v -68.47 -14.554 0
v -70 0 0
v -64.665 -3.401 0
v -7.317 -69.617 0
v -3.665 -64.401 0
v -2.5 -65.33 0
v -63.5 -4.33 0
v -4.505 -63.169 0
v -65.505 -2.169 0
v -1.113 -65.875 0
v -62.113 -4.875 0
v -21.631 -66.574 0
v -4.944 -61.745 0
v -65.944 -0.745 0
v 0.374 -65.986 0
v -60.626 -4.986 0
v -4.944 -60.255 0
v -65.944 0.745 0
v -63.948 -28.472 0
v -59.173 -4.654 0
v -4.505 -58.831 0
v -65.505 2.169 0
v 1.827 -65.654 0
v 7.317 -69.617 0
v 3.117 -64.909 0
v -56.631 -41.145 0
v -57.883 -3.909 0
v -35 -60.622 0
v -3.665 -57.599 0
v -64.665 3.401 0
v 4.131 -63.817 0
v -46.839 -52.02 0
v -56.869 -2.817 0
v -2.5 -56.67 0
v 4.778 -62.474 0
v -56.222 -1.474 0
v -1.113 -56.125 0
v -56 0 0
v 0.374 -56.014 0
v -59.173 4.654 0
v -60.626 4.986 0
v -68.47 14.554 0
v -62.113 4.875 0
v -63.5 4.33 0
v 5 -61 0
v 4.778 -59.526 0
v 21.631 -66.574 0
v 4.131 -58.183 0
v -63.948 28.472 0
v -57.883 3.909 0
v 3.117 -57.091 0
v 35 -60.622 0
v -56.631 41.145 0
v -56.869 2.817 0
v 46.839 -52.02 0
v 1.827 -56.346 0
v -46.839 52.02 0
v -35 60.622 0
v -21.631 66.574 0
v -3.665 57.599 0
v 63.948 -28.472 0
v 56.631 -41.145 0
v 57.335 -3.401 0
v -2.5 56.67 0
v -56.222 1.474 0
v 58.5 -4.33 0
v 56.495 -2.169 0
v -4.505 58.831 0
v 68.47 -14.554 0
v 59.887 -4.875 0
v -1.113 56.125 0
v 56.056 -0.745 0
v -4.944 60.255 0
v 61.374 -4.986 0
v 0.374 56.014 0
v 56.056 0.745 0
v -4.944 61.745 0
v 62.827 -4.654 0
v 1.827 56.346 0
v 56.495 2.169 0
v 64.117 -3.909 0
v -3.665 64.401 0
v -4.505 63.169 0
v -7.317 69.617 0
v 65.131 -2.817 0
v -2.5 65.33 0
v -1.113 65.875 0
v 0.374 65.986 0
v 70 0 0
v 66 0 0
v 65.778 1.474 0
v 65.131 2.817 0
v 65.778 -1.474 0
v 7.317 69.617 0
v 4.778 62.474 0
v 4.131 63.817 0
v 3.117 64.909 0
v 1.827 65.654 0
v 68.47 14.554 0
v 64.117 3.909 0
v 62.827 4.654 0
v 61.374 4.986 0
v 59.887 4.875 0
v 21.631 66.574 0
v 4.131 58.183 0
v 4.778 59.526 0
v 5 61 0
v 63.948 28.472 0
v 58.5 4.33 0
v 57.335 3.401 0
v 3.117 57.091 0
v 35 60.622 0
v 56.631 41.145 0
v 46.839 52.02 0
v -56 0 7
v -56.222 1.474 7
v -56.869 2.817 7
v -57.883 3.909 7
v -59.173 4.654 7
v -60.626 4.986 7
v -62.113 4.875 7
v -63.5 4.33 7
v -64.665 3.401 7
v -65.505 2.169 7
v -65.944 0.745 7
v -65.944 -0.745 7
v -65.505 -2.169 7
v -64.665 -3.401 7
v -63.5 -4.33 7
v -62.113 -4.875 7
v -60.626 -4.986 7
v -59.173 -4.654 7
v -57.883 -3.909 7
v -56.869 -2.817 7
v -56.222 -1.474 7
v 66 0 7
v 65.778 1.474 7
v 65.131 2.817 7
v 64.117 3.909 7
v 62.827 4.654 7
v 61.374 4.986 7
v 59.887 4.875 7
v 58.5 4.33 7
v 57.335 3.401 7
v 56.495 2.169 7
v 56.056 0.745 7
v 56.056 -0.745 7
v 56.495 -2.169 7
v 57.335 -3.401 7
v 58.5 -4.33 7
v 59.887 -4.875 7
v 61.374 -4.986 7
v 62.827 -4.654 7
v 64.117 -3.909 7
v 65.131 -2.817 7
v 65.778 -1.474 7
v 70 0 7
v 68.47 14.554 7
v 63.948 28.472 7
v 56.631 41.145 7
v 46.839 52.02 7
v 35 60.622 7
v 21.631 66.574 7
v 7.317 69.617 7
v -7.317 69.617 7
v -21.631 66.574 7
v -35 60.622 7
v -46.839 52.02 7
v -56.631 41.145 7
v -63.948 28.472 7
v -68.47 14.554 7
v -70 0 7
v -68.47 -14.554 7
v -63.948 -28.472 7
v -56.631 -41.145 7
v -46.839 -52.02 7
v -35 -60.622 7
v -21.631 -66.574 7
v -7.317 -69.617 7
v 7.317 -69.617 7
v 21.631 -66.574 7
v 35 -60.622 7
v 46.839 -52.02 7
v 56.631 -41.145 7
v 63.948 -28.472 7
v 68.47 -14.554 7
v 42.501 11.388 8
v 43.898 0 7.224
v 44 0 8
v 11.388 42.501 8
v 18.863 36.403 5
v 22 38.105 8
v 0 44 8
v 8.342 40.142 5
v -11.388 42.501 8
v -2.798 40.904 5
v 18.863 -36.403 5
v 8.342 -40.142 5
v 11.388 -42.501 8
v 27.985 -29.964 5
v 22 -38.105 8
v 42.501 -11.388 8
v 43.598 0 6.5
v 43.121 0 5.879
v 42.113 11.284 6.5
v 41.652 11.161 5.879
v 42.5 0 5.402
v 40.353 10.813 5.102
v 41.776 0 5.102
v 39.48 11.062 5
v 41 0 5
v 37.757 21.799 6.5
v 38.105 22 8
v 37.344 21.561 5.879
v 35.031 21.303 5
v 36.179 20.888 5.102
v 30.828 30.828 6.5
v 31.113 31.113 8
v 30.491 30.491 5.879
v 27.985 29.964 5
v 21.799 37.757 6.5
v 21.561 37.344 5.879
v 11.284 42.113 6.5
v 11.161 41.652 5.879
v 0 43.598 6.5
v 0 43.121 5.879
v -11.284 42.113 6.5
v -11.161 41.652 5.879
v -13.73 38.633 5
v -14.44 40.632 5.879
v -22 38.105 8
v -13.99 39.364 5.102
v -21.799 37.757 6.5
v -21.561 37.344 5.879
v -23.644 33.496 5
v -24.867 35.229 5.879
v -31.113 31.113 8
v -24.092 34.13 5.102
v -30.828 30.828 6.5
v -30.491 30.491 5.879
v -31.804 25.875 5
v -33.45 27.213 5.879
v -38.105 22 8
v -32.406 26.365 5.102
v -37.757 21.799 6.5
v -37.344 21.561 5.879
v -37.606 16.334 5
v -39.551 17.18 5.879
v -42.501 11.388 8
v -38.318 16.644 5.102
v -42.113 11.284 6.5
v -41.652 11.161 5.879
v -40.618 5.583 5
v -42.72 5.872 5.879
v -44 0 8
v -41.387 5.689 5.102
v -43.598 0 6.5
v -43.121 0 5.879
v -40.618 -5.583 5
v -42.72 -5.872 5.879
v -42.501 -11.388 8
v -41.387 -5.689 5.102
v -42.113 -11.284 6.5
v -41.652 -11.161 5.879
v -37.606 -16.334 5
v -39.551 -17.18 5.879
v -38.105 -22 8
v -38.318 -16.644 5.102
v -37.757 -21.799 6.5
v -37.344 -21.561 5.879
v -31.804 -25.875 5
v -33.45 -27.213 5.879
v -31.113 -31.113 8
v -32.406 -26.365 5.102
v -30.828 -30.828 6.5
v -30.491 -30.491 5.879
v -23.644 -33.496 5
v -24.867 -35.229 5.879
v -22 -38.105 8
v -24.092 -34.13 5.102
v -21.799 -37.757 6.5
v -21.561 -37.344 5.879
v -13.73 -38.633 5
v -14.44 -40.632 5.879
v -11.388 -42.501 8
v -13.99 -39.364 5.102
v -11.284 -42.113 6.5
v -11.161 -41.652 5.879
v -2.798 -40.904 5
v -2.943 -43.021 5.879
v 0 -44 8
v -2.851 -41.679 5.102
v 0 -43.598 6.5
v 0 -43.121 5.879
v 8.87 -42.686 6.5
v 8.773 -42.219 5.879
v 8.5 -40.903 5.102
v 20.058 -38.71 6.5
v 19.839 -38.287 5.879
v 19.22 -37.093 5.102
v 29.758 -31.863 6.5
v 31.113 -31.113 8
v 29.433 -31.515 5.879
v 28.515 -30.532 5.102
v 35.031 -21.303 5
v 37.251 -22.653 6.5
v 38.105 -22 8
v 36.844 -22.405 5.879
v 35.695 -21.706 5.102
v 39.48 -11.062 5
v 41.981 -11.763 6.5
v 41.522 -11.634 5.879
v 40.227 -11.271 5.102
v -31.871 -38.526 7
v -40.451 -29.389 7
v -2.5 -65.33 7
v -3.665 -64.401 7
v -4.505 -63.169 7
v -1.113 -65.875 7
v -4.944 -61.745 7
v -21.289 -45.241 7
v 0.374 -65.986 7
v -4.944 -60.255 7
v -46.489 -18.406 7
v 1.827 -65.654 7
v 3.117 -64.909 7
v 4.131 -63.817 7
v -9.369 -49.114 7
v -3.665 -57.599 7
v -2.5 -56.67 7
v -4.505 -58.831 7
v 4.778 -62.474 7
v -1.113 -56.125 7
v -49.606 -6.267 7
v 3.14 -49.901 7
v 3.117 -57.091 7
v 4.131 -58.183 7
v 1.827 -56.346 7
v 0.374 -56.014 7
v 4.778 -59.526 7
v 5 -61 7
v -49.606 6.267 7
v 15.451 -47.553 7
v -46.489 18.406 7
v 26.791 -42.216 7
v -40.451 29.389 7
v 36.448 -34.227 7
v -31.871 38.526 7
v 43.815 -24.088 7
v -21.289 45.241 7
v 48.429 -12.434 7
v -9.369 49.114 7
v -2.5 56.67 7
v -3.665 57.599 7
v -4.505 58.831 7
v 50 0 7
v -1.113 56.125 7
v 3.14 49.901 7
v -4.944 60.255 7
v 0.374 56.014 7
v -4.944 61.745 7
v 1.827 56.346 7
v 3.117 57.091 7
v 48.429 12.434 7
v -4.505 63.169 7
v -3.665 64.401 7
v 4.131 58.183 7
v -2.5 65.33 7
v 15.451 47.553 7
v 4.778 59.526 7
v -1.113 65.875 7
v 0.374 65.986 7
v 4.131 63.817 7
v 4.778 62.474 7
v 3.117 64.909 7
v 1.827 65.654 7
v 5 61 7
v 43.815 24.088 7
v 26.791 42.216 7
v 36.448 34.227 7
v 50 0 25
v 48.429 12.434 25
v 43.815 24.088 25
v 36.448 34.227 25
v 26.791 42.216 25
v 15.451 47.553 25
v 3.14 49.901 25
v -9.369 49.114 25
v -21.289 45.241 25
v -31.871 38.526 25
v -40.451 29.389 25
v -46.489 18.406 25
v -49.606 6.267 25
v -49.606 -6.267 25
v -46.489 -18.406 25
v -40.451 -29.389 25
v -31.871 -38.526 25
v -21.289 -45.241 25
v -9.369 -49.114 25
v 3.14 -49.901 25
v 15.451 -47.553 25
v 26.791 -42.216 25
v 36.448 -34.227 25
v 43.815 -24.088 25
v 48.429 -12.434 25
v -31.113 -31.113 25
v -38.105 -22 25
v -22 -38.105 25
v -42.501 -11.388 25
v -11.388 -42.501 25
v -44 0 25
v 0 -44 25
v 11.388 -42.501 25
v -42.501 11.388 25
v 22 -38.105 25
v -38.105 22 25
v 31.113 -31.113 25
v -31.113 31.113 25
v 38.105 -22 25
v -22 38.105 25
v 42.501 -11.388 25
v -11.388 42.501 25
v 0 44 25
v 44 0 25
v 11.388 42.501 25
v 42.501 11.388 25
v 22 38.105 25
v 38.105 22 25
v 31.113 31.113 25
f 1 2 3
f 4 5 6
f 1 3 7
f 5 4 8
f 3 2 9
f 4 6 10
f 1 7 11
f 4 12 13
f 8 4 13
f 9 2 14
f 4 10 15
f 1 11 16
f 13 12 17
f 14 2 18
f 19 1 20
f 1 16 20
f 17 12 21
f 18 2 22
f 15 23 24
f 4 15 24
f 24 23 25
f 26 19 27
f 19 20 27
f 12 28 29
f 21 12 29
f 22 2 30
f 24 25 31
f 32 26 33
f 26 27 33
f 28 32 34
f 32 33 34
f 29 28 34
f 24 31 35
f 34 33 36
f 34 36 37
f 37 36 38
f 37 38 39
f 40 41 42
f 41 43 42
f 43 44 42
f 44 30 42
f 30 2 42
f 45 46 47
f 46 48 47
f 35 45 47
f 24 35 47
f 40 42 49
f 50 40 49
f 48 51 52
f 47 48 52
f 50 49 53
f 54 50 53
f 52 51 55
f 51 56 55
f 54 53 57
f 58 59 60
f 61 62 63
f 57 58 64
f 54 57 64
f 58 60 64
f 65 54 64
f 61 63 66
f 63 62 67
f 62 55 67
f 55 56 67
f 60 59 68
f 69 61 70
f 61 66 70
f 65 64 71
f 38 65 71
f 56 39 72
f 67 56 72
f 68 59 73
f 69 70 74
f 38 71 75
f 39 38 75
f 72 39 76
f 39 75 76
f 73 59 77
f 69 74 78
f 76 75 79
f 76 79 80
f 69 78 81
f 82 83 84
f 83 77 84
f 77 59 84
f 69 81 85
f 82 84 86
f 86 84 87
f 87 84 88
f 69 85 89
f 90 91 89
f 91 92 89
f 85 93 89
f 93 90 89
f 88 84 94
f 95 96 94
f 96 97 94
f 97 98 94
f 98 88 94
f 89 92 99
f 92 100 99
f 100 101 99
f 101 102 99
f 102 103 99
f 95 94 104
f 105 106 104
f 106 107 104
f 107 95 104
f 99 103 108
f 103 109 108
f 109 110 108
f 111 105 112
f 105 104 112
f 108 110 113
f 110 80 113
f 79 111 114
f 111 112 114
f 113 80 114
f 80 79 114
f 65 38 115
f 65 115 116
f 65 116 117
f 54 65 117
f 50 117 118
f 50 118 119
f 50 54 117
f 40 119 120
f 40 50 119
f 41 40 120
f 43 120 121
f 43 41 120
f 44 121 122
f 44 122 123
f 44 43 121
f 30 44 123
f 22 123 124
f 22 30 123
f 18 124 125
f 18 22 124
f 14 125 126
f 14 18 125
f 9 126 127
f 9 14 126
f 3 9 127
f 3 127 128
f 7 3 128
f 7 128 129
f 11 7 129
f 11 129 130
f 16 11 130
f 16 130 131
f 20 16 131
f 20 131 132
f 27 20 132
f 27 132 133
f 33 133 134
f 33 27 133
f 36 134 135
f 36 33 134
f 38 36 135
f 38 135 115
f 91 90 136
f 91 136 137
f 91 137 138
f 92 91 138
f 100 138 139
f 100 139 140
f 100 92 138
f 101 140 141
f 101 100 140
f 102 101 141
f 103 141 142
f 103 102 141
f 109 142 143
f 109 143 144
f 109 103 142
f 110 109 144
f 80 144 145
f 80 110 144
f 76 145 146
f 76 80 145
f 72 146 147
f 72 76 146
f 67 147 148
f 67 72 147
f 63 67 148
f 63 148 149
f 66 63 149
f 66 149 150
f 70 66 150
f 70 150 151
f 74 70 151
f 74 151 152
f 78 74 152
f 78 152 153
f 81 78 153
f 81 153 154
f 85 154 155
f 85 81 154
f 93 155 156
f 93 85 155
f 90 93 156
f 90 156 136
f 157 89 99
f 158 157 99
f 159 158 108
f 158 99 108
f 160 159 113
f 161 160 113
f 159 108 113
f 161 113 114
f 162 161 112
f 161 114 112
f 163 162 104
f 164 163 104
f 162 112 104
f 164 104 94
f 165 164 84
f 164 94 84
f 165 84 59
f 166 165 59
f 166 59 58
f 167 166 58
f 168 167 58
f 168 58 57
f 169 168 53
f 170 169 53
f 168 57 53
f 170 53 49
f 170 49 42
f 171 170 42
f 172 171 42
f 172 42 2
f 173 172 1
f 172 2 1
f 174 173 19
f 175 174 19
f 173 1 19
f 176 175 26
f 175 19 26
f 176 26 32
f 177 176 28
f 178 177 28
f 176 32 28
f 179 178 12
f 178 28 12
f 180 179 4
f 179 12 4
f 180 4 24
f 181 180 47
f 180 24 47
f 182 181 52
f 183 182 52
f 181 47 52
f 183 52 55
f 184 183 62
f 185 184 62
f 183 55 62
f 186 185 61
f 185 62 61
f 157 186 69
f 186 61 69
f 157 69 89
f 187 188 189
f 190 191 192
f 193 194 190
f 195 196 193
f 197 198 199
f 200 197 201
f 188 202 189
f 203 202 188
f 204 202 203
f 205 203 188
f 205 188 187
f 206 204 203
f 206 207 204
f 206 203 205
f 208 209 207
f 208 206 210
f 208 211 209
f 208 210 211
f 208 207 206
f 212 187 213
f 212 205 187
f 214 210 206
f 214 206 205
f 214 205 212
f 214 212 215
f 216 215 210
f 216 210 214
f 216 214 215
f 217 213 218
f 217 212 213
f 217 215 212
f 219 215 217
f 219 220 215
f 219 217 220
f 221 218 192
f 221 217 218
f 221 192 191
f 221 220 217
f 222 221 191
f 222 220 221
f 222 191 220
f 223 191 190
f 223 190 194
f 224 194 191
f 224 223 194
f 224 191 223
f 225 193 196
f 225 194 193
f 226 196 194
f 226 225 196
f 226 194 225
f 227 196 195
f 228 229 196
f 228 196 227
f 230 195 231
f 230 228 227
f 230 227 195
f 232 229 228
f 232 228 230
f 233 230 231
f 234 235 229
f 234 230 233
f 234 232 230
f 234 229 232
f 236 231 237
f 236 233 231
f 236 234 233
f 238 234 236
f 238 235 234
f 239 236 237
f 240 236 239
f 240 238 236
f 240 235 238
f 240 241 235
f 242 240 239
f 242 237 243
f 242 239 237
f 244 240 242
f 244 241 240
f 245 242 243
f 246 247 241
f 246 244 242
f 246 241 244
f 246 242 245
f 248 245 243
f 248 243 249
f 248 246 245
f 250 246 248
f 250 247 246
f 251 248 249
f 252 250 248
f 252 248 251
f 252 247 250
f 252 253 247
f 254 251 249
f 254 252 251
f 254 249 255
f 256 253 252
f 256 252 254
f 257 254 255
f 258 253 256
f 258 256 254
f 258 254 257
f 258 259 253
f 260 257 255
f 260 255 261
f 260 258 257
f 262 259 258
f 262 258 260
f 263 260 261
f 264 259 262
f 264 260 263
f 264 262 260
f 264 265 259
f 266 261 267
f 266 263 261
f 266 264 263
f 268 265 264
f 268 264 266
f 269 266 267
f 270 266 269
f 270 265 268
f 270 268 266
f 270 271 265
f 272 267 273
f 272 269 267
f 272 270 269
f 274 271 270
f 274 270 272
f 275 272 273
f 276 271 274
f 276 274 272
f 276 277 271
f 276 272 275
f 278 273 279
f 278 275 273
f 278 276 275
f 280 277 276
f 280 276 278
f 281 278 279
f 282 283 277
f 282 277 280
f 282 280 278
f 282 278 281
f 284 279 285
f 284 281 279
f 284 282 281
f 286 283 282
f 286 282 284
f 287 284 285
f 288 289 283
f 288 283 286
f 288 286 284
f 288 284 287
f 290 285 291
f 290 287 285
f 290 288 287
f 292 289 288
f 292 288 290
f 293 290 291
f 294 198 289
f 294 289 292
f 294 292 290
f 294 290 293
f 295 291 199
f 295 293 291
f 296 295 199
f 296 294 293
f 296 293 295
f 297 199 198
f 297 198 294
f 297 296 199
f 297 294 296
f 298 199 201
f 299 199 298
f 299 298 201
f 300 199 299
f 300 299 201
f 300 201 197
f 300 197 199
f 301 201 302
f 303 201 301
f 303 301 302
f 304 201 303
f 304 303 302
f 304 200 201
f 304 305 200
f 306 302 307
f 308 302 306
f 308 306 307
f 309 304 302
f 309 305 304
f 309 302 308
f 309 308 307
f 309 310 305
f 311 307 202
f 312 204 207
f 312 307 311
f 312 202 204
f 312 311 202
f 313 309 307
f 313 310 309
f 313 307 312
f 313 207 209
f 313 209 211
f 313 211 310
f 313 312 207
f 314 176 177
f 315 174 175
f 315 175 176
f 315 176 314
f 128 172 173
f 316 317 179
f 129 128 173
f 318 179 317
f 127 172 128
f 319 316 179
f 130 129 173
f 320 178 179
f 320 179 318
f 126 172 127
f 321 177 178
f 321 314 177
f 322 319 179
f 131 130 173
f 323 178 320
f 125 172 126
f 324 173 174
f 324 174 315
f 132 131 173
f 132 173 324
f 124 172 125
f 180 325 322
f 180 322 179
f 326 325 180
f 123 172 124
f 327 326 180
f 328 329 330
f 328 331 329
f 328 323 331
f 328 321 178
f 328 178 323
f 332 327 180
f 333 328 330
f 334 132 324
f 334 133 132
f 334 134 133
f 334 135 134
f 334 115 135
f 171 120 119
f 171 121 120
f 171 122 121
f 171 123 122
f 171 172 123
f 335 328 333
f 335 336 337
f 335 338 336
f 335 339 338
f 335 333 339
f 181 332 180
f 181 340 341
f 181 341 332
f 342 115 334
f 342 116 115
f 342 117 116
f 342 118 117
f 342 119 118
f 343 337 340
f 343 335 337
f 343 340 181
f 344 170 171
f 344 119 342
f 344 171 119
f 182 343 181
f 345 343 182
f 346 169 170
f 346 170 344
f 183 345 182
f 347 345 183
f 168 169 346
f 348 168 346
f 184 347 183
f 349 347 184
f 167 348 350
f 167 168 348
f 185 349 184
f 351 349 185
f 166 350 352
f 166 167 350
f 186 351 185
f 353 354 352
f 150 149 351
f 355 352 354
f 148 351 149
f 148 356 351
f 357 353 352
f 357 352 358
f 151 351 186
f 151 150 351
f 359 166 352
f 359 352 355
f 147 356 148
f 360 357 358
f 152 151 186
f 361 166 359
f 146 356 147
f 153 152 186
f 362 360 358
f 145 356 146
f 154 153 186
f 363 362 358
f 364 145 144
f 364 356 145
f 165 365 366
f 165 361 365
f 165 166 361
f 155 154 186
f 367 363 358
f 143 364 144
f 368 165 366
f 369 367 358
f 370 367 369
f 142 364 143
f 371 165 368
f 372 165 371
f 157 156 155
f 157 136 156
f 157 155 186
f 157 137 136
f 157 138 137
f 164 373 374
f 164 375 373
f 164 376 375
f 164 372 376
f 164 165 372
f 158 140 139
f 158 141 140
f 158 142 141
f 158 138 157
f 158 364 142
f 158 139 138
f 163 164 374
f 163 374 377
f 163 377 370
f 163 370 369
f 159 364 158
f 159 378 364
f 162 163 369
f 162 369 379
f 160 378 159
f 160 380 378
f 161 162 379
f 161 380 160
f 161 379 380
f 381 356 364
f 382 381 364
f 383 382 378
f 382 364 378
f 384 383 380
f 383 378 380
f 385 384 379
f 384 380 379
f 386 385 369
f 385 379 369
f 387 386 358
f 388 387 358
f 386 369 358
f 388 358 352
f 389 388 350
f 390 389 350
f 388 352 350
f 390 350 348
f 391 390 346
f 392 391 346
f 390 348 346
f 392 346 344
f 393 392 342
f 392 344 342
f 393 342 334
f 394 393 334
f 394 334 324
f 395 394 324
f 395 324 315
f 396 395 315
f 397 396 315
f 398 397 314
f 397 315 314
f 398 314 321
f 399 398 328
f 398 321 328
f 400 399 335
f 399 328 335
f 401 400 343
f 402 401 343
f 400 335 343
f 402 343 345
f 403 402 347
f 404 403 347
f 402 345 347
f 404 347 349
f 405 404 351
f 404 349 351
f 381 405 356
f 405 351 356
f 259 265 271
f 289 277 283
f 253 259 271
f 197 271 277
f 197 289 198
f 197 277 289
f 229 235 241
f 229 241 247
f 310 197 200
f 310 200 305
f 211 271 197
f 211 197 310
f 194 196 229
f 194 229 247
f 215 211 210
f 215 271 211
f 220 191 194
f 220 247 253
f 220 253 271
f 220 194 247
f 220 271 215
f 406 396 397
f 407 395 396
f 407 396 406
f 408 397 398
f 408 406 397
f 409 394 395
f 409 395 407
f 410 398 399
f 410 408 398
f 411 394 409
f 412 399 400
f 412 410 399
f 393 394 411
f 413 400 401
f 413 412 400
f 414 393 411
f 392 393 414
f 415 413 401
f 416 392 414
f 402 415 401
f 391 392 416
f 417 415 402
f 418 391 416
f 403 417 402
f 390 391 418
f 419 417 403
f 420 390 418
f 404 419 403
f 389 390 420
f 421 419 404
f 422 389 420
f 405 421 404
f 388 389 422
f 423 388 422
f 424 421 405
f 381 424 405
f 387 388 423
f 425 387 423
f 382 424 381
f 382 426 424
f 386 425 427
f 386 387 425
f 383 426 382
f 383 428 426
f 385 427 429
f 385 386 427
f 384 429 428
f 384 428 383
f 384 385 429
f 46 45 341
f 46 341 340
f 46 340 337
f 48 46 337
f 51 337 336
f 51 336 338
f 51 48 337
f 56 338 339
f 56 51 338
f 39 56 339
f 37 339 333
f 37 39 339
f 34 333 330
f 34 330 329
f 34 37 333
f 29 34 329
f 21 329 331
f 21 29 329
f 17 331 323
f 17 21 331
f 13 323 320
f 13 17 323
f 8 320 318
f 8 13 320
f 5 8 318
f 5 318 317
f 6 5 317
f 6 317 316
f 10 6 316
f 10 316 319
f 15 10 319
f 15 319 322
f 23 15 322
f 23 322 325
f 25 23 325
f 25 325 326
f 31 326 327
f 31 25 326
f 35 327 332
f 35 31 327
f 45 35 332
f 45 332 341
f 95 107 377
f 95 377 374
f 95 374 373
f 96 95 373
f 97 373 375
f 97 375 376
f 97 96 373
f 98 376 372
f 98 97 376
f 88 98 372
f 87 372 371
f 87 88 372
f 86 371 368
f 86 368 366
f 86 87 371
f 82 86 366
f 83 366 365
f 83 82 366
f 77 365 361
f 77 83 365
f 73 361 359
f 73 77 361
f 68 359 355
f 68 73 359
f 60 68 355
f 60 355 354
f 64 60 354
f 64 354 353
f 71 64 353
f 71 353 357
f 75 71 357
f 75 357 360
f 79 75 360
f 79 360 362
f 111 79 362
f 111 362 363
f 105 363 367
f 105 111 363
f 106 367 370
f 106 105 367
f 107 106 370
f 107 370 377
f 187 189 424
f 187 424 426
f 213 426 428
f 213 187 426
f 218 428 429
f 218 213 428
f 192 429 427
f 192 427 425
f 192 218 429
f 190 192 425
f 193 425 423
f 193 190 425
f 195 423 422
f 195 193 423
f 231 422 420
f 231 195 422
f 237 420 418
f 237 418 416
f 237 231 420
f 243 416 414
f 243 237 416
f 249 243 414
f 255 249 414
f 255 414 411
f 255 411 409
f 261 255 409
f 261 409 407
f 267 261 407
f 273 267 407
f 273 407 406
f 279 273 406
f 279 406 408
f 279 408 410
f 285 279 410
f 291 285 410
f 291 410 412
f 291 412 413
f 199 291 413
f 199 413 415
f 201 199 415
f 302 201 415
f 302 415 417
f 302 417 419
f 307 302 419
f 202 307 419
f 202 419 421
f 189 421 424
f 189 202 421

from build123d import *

# Parameters (mm, degrees)
F0_R     = 70
F0_R_2   = 5
F1_DEPTH = 7
F2_R     = 50
F2_R_2   = 44
F3_DEPTH = 18
F4_R     = 44
F5_DEPTH = 2
F6_R     = 3


with BuildPart() as f1:
    # F0 (on Top) → F1 (new body)
    with BuildSketch(Plane.XY):
        Circle(F0_R)
        with Locations((0, -61)):
            Circle(F0_R_2, mode=Mode.SUBTRACT)
        with Locations((-61, 0)):
            Circle(F0_R_2, mode=Mode.SUBTRACT)
        with Locations((61, 0)):
            Circle(F0_R_2, mode=Mode.SUBTRACT)
        with Locations((0, 61)):
            Circle(F0_R_2, mode=Mode.SUBTRACT)
    extrude(amount=F1_DEPTH)

    # F2 (on face) → F3 (join)
    with BuildSketch(Plane.XY.offset(7)):
        Circle(F2_R)
        Circle(F2_R_2, mode=Mode.SUBTRACT)
    extrude(amount=F3_DEPTH)

    # F4 (on face) → F5 (cut)
    with BuildSketch(Plane.XY.offset(7)):
        Circle(F4_R)
    extrude(amount=-F5_DEPTH, mode=Mode.SUBTRACT)

    # F6
    f6_edges = [f1.edges().sort_by_distance(p)[0] for p in [
        (-44, 0, 5),
    ]]
    fillet(f6_edges, radius=F6_R)


solid = f1.part
